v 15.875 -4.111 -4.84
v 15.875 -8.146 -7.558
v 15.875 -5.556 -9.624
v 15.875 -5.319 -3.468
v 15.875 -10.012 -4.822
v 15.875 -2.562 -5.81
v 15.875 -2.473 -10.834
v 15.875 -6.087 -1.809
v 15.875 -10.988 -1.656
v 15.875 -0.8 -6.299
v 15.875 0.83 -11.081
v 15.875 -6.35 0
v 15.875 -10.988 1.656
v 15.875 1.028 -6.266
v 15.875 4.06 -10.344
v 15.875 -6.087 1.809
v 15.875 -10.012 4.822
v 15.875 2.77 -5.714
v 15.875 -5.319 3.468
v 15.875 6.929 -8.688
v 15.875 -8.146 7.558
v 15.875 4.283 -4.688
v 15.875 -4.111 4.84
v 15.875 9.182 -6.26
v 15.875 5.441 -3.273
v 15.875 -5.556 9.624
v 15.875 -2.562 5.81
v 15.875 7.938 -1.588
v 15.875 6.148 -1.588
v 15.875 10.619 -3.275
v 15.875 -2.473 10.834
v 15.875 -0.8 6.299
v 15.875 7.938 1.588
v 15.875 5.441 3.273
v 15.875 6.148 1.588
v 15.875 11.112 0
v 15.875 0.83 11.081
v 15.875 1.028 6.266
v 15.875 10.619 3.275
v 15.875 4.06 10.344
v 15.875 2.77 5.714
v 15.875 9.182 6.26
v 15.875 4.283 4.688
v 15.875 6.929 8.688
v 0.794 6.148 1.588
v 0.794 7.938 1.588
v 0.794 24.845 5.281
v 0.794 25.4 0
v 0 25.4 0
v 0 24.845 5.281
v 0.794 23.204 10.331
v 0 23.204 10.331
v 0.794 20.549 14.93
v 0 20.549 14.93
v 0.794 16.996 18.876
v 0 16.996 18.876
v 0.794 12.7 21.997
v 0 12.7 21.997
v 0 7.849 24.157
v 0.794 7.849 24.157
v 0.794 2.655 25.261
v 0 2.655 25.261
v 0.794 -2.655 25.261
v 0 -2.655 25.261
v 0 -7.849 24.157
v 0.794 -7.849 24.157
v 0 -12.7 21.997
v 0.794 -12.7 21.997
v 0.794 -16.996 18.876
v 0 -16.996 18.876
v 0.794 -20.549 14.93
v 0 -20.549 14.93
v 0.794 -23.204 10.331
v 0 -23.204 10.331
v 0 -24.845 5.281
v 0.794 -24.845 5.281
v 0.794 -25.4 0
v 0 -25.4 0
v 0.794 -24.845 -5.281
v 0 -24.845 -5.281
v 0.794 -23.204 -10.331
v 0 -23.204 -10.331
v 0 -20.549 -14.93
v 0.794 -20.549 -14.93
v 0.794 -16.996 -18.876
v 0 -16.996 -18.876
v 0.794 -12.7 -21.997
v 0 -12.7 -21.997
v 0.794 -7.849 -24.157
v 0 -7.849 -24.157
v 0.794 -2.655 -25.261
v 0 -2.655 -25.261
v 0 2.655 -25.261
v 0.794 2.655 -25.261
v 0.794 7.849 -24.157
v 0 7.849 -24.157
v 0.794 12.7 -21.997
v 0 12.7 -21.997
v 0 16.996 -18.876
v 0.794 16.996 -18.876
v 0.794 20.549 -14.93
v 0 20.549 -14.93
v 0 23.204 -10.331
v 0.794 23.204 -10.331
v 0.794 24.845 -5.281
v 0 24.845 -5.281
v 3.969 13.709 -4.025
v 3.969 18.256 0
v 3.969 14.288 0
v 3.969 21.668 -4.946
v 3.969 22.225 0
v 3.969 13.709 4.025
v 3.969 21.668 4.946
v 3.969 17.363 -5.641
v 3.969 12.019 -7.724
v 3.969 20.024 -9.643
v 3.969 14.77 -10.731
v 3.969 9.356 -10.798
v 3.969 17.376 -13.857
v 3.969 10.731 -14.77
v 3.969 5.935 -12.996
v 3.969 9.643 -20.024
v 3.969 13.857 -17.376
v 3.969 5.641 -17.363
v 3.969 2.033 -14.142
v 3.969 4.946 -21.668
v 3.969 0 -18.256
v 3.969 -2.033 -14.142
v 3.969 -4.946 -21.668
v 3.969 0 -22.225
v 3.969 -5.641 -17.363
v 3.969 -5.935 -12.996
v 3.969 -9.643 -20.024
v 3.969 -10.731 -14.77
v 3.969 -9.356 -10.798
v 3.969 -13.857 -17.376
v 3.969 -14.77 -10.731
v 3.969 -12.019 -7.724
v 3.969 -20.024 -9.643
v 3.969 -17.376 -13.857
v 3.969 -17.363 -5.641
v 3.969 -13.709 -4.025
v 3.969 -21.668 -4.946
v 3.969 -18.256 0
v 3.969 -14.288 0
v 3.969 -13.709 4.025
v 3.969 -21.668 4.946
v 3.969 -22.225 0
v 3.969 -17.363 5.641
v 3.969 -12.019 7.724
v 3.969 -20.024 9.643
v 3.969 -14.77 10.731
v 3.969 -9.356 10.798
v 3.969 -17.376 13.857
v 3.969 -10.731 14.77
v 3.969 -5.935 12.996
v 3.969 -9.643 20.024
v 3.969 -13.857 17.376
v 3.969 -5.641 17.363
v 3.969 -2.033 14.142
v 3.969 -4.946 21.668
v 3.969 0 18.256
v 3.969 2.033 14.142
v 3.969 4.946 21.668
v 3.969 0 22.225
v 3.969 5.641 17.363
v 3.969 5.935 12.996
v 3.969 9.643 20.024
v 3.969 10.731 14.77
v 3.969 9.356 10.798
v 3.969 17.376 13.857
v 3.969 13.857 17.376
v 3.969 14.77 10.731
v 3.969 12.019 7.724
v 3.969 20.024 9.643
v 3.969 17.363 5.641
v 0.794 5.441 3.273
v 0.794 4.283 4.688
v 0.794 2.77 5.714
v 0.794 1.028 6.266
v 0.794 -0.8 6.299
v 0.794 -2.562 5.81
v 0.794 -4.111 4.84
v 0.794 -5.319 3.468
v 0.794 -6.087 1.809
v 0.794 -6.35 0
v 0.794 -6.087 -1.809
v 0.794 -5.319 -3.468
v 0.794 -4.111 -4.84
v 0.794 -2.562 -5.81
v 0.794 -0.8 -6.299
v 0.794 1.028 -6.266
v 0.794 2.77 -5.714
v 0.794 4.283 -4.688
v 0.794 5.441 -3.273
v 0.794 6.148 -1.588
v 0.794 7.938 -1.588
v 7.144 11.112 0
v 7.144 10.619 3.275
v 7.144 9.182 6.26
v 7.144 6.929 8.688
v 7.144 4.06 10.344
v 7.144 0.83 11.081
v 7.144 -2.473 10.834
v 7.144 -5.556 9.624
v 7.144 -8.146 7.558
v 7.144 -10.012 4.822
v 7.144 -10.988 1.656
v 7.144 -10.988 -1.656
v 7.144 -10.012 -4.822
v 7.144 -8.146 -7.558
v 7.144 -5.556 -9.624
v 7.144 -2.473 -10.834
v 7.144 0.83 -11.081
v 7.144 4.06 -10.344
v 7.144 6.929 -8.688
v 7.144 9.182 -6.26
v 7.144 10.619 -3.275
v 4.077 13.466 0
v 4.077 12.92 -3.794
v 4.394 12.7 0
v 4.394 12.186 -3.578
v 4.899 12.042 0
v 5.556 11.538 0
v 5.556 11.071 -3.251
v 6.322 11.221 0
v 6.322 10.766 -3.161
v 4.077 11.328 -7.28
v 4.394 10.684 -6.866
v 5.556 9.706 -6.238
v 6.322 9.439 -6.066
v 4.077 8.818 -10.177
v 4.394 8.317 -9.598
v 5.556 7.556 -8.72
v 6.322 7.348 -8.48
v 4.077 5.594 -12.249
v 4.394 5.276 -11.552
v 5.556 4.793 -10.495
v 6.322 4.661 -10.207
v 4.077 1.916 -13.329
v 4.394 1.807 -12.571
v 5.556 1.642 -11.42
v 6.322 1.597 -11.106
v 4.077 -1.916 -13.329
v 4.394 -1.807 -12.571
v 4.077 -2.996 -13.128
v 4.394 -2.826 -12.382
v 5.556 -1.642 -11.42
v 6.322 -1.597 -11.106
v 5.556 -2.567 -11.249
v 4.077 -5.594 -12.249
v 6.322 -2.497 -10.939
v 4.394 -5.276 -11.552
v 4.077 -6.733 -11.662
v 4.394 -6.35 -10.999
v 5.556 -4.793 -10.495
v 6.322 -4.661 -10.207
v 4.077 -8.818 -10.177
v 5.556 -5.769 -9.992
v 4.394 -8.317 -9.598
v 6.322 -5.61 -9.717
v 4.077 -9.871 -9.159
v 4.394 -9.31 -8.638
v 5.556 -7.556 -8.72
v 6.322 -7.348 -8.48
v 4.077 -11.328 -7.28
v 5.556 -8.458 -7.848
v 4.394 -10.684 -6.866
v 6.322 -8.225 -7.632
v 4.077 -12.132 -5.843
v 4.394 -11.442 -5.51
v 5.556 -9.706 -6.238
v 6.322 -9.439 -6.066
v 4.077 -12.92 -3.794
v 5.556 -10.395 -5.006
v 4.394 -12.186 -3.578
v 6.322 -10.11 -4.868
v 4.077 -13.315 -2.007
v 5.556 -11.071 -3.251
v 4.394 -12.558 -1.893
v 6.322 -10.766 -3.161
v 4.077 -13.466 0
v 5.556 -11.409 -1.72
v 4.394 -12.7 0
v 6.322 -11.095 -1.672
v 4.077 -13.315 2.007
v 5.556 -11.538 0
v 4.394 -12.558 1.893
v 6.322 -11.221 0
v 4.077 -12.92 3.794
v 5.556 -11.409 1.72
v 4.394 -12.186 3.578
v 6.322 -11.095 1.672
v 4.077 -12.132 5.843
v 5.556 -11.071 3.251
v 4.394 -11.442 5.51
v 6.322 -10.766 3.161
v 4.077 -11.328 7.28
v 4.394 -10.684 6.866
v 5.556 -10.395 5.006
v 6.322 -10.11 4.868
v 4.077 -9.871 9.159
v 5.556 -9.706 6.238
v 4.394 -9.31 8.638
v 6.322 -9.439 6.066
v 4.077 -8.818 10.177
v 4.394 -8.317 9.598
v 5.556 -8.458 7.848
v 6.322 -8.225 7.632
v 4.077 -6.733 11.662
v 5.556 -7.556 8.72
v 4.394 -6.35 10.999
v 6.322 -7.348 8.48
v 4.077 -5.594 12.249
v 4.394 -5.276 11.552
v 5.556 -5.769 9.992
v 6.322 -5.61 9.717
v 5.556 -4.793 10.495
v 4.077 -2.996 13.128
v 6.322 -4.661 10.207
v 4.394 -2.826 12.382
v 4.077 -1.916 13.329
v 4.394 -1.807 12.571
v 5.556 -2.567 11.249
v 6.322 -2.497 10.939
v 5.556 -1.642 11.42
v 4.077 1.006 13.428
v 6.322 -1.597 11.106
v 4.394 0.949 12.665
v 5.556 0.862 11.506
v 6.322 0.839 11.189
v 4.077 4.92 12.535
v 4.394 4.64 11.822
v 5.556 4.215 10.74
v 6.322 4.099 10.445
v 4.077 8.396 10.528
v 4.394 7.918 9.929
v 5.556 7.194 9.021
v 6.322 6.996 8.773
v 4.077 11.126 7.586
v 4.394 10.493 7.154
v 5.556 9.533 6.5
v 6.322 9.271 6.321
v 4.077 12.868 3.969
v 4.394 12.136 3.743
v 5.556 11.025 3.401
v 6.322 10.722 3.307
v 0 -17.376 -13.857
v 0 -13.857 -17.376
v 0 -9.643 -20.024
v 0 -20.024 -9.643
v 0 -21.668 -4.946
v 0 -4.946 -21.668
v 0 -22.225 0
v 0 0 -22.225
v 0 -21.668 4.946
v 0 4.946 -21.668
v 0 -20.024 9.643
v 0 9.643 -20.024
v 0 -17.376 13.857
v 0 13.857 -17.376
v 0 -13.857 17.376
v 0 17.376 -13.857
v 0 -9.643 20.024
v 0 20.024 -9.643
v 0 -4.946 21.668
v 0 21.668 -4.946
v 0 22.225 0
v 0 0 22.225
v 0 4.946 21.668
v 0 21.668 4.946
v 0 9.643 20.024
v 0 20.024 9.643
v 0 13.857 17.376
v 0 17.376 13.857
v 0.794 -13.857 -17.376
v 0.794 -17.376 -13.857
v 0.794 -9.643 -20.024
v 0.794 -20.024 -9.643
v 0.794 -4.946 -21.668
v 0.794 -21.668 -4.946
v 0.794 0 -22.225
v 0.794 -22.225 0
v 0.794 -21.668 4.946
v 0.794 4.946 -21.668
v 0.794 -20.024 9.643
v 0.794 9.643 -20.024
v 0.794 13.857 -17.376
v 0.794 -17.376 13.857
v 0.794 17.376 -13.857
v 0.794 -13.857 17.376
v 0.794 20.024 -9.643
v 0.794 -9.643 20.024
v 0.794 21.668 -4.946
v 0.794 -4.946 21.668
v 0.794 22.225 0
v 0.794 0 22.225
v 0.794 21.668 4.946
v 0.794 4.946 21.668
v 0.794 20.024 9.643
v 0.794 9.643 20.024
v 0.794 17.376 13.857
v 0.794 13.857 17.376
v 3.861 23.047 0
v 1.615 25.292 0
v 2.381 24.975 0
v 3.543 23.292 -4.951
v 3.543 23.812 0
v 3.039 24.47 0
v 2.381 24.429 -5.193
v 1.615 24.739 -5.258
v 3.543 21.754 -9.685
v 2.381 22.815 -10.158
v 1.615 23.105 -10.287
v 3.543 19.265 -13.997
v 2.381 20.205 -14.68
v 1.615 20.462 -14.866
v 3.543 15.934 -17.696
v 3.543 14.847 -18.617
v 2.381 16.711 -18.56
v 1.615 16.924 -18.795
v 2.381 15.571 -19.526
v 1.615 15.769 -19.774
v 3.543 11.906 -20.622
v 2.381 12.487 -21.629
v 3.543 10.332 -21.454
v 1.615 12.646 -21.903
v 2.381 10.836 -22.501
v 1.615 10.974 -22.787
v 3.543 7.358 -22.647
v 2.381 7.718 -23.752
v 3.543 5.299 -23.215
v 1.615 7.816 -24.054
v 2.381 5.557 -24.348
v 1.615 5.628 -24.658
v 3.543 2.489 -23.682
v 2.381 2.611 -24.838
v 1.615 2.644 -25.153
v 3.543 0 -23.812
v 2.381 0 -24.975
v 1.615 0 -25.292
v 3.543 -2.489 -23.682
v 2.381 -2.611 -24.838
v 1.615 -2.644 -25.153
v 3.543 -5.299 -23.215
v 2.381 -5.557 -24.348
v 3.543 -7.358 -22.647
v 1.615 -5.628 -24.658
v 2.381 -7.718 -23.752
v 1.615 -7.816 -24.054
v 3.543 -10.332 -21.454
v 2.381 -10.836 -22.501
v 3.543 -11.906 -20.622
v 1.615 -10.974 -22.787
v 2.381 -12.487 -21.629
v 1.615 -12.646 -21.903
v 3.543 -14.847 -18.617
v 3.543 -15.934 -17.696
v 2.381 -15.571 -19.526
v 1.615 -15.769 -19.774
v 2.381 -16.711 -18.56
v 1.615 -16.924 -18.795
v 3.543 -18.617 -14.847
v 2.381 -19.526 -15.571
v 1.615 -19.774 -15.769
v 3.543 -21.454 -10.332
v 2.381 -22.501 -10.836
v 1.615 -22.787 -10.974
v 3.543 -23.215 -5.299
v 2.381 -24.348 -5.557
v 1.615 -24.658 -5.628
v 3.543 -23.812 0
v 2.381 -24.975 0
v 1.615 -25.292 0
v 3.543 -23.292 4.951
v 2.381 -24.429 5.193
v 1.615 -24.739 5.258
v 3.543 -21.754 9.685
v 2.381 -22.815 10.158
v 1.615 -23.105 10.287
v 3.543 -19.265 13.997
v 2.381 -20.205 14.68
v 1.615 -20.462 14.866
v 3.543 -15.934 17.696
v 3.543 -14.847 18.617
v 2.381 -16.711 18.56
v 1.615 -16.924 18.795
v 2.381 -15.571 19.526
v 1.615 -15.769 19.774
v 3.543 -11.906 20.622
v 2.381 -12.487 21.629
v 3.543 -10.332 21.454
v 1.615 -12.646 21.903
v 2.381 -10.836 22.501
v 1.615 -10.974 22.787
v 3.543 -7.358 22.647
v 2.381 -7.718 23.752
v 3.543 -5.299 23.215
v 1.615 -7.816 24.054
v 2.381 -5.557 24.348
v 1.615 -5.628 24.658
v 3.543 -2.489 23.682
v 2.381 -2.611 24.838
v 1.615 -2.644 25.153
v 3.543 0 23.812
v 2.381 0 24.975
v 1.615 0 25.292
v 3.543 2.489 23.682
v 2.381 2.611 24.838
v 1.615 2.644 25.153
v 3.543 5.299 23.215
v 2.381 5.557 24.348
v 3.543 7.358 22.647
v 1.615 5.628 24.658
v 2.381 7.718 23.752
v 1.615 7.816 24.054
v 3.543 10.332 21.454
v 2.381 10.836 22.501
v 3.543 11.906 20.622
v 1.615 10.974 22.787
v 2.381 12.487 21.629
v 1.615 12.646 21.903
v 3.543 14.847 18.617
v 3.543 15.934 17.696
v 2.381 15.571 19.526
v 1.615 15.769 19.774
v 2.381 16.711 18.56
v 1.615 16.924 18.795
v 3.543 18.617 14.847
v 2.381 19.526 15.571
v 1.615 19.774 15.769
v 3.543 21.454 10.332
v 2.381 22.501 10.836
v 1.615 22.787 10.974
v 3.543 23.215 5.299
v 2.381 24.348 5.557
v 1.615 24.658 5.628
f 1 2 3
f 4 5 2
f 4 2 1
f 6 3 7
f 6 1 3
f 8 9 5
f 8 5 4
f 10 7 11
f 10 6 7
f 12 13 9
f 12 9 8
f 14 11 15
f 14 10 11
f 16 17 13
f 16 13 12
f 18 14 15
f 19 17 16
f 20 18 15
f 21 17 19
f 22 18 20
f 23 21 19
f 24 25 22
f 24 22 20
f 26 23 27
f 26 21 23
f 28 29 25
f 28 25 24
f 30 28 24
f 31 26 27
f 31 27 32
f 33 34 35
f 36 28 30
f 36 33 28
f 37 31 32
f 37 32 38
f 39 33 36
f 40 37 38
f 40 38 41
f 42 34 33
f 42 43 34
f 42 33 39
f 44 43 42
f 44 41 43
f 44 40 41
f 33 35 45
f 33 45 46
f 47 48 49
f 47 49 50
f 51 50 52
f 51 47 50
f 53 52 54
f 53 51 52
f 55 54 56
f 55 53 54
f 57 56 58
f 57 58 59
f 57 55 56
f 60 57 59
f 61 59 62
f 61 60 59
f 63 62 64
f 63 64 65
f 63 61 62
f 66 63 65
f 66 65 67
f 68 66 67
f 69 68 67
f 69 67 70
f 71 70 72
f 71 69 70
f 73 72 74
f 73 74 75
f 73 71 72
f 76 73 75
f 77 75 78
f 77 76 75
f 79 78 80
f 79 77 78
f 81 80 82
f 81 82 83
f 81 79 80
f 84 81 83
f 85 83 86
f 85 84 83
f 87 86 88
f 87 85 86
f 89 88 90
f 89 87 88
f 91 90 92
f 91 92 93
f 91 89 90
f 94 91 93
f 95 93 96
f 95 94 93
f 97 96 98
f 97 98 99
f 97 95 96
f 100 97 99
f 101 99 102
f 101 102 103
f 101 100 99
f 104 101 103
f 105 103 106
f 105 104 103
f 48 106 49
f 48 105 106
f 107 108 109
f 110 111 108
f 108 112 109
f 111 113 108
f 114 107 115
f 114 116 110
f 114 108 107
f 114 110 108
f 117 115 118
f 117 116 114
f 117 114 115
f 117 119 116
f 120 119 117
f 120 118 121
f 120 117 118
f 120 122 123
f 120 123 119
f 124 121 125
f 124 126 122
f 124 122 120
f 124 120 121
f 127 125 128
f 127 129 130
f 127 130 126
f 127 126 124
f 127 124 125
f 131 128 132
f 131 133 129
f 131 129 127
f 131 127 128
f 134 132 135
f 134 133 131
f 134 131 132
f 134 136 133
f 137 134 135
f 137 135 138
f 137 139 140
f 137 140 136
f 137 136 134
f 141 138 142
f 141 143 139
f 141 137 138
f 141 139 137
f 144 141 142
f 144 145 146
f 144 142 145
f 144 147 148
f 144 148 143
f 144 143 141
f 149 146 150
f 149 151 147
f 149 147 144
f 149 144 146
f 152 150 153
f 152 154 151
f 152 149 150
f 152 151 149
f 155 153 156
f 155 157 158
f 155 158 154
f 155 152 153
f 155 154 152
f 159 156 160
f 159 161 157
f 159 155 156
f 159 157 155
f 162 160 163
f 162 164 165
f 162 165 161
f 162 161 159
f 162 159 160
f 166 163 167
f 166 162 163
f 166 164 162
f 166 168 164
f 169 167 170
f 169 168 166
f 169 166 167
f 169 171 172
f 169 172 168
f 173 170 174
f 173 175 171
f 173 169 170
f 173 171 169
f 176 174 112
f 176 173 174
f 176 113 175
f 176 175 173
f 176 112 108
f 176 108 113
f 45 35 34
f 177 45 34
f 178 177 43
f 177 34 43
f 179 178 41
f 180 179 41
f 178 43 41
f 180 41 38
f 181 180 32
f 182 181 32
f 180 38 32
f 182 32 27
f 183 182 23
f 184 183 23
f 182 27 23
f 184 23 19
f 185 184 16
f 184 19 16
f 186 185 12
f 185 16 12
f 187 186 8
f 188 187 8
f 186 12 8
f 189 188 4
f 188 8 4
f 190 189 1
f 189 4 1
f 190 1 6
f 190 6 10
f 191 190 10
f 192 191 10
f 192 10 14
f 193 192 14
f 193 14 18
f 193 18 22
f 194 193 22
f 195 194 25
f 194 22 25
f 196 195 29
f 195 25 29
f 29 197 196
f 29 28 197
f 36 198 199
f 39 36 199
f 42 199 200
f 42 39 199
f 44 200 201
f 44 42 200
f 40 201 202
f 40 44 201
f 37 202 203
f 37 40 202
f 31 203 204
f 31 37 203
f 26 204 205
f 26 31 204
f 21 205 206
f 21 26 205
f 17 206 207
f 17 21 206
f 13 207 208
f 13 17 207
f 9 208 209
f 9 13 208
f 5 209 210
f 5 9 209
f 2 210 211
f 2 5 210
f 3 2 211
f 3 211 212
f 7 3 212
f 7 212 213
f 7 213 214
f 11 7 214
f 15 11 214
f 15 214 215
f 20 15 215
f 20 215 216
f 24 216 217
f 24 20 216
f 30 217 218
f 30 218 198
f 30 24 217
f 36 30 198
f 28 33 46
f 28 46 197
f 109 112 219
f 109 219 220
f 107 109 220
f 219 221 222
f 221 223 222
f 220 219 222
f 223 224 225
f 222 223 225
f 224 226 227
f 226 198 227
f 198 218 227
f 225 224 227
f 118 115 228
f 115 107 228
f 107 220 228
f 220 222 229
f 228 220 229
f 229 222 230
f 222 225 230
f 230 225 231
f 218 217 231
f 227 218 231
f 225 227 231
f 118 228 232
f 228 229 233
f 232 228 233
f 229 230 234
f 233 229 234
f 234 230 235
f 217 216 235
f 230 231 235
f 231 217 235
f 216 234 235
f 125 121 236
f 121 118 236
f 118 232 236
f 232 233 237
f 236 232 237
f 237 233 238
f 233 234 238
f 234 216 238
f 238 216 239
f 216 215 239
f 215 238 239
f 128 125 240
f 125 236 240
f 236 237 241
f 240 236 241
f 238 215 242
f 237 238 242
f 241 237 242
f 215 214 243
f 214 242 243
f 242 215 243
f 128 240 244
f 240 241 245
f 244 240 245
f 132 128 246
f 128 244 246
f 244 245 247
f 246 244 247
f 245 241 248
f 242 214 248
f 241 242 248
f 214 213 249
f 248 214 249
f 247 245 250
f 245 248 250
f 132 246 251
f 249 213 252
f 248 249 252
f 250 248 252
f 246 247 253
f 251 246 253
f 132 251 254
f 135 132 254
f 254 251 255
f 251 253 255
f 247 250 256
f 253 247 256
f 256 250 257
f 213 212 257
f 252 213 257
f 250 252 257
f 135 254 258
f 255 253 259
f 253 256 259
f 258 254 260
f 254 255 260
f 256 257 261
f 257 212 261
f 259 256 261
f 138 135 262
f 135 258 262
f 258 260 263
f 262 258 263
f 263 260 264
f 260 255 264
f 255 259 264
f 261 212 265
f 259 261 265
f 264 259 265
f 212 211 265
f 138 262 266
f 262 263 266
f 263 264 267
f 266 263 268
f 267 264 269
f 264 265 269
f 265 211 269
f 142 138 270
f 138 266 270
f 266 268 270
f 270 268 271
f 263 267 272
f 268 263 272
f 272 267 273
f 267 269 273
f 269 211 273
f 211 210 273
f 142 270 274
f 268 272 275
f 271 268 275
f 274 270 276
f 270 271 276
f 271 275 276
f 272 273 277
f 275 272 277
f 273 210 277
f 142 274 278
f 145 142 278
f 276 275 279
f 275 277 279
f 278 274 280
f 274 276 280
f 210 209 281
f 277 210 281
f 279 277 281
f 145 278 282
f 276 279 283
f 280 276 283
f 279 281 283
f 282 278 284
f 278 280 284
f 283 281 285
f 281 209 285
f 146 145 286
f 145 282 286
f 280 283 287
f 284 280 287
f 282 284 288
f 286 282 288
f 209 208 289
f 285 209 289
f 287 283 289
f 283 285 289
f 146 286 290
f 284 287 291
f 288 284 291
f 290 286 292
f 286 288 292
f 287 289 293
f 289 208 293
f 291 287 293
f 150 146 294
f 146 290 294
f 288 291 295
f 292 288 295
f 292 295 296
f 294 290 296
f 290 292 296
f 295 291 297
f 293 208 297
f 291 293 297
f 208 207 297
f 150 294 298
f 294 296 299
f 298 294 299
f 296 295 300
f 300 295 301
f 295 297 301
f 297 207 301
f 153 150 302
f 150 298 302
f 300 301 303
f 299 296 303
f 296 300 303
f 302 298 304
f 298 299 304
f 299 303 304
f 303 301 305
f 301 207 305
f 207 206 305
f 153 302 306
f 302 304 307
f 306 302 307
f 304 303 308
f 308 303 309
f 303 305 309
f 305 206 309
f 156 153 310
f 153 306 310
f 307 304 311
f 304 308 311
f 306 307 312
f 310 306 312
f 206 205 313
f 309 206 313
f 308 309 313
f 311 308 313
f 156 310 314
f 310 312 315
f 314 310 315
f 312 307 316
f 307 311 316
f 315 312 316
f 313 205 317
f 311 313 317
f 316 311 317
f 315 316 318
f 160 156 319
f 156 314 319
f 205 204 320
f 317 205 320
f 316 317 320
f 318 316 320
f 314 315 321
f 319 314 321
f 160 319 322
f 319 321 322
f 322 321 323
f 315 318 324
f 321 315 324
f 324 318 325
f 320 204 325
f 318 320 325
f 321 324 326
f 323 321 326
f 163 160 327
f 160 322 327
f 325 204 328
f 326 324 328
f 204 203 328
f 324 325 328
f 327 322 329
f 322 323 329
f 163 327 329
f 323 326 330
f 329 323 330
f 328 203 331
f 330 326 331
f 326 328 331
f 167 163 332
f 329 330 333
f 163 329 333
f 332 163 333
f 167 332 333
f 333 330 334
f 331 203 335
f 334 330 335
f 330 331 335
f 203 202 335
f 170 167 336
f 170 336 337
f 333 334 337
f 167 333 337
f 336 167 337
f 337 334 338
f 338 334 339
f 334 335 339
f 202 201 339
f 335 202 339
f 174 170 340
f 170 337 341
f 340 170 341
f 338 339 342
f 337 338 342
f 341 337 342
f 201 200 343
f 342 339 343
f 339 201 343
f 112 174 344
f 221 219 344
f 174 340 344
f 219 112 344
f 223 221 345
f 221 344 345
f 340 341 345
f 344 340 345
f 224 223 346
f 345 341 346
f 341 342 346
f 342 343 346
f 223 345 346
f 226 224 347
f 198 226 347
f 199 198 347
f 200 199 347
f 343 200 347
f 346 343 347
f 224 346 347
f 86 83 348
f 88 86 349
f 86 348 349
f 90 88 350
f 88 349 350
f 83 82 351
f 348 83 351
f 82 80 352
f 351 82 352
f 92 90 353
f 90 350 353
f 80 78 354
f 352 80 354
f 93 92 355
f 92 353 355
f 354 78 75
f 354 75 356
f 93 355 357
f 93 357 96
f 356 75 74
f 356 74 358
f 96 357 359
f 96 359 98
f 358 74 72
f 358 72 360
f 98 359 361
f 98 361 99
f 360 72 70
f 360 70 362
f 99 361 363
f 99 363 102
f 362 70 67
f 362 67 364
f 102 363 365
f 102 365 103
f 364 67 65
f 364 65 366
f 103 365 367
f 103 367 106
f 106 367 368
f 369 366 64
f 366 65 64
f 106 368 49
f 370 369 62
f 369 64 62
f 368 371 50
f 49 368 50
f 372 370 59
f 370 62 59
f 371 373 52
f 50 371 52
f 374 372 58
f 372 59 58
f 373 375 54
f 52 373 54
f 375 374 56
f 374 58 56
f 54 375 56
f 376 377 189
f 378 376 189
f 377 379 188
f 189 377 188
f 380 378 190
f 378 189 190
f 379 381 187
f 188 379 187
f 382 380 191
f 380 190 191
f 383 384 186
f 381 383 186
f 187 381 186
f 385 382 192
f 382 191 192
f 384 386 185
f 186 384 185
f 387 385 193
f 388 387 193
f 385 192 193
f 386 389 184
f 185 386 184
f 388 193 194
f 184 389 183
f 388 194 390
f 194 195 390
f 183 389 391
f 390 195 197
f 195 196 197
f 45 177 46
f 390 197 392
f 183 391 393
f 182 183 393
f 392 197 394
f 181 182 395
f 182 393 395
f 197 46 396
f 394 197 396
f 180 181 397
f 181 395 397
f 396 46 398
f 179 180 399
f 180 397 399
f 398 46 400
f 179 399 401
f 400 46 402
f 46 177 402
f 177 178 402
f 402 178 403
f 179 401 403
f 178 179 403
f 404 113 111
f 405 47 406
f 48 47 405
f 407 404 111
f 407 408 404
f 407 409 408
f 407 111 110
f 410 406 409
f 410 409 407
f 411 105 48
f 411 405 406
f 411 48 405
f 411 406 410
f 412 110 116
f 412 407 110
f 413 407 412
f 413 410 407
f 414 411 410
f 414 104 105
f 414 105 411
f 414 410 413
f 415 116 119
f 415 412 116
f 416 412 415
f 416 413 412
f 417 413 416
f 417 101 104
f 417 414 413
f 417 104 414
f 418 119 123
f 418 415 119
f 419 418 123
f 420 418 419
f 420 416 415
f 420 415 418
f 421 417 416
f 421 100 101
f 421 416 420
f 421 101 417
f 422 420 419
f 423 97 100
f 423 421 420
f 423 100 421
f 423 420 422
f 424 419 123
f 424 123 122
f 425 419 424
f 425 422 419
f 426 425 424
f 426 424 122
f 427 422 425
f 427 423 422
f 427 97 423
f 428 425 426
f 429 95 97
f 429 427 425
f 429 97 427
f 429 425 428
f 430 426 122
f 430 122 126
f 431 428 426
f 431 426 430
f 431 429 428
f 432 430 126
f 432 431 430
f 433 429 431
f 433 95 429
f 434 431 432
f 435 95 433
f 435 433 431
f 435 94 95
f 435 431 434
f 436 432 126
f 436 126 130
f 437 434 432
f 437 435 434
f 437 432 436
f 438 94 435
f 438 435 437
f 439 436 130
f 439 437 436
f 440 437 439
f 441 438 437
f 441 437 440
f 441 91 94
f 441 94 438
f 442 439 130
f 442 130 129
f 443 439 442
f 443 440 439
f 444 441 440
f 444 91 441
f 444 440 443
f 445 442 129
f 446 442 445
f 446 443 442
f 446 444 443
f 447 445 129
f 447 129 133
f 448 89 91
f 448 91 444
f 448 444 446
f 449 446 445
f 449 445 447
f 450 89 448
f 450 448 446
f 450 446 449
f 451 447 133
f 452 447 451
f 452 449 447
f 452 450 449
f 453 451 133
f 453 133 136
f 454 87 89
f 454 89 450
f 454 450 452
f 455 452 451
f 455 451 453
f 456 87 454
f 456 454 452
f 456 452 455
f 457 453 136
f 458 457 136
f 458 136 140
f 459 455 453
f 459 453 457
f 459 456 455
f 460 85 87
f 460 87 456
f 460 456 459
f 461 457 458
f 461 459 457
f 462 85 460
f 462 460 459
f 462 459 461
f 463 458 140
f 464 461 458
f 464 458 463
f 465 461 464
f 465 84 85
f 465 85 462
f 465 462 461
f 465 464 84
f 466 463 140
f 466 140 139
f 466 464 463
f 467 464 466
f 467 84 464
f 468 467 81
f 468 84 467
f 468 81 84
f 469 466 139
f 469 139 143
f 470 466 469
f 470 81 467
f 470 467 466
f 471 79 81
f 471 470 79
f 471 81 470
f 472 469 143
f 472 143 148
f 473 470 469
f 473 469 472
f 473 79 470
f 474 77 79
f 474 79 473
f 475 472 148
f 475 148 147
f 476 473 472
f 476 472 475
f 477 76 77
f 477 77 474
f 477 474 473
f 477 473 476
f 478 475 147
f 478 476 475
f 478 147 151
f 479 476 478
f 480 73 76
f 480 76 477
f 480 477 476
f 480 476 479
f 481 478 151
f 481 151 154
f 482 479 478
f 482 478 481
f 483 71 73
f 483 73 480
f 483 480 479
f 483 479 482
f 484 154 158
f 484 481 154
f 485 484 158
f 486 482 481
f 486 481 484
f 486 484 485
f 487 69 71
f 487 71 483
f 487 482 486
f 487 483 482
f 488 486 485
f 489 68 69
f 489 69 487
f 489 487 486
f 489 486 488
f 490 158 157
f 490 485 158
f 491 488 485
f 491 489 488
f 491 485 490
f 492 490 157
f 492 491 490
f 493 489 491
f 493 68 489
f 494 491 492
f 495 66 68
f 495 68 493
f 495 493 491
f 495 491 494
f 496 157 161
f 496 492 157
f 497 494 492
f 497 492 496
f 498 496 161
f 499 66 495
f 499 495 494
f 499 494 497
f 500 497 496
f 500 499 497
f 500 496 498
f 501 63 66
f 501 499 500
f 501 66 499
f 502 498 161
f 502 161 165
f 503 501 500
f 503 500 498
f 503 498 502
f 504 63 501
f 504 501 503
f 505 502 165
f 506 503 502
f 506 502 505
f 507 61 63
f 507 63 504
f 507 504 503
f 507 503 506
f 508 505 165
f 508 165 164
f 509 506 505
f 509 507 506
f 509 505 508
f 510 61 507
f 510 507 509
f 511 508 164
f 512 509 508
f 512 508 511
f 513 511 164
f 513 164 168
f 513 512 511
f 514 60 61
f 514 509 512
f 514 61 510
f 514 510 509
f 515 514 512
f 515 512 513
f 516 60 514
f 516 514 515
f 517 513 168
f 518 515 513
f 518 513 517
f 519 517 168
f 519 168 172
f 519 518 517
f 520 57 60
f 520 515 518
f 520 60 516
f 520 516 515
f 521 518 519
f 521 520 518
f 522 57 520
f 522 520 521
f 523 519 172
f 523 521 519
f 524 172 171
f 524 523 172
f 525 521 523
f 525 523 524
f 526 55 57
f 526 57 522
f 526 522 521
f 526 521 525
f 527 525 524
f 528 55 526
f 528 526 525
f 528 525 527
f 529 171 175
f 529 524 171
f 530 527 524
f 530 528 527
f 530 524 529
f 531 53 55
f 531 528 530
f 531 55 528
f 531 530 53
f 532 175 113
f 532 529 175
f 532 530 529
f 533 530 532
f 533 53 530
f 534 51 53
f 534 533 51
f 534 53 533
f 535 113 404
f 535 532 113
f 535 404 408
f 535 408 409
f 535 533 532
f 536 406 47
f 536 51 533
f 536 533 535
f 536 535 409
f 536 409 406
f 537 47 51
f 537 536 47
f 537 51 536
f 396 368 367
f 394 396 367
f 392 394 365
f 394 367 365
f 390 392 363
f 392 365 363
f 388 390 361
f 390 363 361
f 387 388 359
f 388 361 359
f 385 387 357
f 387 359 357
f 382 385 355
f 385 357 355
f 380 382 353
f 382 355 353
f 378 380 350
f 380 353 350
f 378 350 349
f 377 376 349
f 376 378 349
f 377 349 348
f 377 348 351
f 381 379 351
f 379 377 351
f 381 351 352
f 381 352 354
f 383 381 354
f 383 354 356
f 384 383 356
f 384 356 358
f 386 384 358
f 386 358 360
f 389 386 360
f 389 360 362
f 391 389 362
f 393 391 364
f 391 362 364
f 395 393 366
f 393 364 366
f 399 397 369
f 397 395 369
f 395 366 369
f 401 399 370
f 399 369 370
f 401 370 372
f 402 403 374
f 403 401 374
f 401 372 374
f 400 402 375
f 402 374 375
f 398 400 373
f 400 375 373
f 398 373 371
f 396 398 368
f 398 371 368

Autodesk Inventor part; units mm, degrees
ref_plane "YZ Plane" through (0, 0, 0) normal (1, 0, 0) x (0, 1, 0)
ref_plane "XZ Plane" through (0, 0, 0) normal (0, 1, 0) x (-1, 0, 0)
ref_plane "XY Plane" through (0, 0, 0) normal (0, 0, 1) x (1, 0, 0)
sketch "Sketch1" plane through (0, 0, 0) normal (0, 0, 1) x (1, 0, 0)
  line L0 (0, 25.4) -> (0.7937, 25.4)
  line L1 (3.9687, 22.225) -> (3.9688, 14.2875)
  line L2 (7.1437, 11.1125) -> (15.875, 11.1125)
  line L3 (0, 25.4) -> (0, 22.225)
  line L4 (-3.175, 0) -> (19.05, 0) projected
  line L5 (0, -5.2115) -> (0, 31.2691) construction
  line L6 (15.875, 11.1125) -> (15.875, 6.35)
  arc A0 (3.9687, 22.225) -> (0.7937, 25.4) centre (0.7937, 22.225) ccw
  arc A1 (3.9688, 14.2875) -> (7.1437, 11.1125) centre (7.1438, 14.2875) ccw
  line L7 (0.7937, 22.225) -> (0.7937, 6.35)
  line L8 (0.7937, 22.225) -> (0, 22.225)
  line L9 (0.7937, 6.35) -> (15.875, 6.35)
  point P0 (0, 0)
  dimension "d0" = 50.8
  dimension "d1" = 22.225
  dimension "d2" = 0
  dimension "d3" = 15.875
  dimension "d4" = 3.9688
  dimension "d5" = 3.175
  dimension "d6" = 0.7937
  dimension "d7" = 44.45
  dimension "d8" = 12.7
revolve "Revolution1" add sketch "Sketch1" angle 360 about axis through (-10, 0, 0) along (1, 0, 0)
sketch "Sketch2" plane through (15.875, 0, 0) normal (1, 0, 0) x (0, 0, -1)
  line L0 (0, -35.56) -> (0, 35.56) construction
  line L1 (35.56, 0) -> (-35.56, 0) construction
  line L2 (-1.5875, 7.9375) -> (1.5875, 7.9375)
  line L3 (1.5875, 7.9375) -> (1.5875, 4.7625)
  line L4 (1.5875, 4.7625) -> (-1.5875, 4.7625)
  line L5 (-1.5875, 4.7625) -> (-1.5875, 7.9375)
  line L6 (-4.6004, 6.35) -> (6.3294, 6.35) construction
  circle A0 centre (0, 0) radius 6.35 construction
  dimension "d10" = 3.175
  dimension "d11" = 1.5875
  dimension "d12" = 1.5875
  dimension "d13" = 3.175
extrude "Extrusion1" cut sketch "Sketch2" against normal through all
equation "\"d11\" = 0.5 * d10"
equation "\"d13\" = 2 * d12"
properties part number "Brida de la Rueda" material "Aluminum 6061-AHC"
